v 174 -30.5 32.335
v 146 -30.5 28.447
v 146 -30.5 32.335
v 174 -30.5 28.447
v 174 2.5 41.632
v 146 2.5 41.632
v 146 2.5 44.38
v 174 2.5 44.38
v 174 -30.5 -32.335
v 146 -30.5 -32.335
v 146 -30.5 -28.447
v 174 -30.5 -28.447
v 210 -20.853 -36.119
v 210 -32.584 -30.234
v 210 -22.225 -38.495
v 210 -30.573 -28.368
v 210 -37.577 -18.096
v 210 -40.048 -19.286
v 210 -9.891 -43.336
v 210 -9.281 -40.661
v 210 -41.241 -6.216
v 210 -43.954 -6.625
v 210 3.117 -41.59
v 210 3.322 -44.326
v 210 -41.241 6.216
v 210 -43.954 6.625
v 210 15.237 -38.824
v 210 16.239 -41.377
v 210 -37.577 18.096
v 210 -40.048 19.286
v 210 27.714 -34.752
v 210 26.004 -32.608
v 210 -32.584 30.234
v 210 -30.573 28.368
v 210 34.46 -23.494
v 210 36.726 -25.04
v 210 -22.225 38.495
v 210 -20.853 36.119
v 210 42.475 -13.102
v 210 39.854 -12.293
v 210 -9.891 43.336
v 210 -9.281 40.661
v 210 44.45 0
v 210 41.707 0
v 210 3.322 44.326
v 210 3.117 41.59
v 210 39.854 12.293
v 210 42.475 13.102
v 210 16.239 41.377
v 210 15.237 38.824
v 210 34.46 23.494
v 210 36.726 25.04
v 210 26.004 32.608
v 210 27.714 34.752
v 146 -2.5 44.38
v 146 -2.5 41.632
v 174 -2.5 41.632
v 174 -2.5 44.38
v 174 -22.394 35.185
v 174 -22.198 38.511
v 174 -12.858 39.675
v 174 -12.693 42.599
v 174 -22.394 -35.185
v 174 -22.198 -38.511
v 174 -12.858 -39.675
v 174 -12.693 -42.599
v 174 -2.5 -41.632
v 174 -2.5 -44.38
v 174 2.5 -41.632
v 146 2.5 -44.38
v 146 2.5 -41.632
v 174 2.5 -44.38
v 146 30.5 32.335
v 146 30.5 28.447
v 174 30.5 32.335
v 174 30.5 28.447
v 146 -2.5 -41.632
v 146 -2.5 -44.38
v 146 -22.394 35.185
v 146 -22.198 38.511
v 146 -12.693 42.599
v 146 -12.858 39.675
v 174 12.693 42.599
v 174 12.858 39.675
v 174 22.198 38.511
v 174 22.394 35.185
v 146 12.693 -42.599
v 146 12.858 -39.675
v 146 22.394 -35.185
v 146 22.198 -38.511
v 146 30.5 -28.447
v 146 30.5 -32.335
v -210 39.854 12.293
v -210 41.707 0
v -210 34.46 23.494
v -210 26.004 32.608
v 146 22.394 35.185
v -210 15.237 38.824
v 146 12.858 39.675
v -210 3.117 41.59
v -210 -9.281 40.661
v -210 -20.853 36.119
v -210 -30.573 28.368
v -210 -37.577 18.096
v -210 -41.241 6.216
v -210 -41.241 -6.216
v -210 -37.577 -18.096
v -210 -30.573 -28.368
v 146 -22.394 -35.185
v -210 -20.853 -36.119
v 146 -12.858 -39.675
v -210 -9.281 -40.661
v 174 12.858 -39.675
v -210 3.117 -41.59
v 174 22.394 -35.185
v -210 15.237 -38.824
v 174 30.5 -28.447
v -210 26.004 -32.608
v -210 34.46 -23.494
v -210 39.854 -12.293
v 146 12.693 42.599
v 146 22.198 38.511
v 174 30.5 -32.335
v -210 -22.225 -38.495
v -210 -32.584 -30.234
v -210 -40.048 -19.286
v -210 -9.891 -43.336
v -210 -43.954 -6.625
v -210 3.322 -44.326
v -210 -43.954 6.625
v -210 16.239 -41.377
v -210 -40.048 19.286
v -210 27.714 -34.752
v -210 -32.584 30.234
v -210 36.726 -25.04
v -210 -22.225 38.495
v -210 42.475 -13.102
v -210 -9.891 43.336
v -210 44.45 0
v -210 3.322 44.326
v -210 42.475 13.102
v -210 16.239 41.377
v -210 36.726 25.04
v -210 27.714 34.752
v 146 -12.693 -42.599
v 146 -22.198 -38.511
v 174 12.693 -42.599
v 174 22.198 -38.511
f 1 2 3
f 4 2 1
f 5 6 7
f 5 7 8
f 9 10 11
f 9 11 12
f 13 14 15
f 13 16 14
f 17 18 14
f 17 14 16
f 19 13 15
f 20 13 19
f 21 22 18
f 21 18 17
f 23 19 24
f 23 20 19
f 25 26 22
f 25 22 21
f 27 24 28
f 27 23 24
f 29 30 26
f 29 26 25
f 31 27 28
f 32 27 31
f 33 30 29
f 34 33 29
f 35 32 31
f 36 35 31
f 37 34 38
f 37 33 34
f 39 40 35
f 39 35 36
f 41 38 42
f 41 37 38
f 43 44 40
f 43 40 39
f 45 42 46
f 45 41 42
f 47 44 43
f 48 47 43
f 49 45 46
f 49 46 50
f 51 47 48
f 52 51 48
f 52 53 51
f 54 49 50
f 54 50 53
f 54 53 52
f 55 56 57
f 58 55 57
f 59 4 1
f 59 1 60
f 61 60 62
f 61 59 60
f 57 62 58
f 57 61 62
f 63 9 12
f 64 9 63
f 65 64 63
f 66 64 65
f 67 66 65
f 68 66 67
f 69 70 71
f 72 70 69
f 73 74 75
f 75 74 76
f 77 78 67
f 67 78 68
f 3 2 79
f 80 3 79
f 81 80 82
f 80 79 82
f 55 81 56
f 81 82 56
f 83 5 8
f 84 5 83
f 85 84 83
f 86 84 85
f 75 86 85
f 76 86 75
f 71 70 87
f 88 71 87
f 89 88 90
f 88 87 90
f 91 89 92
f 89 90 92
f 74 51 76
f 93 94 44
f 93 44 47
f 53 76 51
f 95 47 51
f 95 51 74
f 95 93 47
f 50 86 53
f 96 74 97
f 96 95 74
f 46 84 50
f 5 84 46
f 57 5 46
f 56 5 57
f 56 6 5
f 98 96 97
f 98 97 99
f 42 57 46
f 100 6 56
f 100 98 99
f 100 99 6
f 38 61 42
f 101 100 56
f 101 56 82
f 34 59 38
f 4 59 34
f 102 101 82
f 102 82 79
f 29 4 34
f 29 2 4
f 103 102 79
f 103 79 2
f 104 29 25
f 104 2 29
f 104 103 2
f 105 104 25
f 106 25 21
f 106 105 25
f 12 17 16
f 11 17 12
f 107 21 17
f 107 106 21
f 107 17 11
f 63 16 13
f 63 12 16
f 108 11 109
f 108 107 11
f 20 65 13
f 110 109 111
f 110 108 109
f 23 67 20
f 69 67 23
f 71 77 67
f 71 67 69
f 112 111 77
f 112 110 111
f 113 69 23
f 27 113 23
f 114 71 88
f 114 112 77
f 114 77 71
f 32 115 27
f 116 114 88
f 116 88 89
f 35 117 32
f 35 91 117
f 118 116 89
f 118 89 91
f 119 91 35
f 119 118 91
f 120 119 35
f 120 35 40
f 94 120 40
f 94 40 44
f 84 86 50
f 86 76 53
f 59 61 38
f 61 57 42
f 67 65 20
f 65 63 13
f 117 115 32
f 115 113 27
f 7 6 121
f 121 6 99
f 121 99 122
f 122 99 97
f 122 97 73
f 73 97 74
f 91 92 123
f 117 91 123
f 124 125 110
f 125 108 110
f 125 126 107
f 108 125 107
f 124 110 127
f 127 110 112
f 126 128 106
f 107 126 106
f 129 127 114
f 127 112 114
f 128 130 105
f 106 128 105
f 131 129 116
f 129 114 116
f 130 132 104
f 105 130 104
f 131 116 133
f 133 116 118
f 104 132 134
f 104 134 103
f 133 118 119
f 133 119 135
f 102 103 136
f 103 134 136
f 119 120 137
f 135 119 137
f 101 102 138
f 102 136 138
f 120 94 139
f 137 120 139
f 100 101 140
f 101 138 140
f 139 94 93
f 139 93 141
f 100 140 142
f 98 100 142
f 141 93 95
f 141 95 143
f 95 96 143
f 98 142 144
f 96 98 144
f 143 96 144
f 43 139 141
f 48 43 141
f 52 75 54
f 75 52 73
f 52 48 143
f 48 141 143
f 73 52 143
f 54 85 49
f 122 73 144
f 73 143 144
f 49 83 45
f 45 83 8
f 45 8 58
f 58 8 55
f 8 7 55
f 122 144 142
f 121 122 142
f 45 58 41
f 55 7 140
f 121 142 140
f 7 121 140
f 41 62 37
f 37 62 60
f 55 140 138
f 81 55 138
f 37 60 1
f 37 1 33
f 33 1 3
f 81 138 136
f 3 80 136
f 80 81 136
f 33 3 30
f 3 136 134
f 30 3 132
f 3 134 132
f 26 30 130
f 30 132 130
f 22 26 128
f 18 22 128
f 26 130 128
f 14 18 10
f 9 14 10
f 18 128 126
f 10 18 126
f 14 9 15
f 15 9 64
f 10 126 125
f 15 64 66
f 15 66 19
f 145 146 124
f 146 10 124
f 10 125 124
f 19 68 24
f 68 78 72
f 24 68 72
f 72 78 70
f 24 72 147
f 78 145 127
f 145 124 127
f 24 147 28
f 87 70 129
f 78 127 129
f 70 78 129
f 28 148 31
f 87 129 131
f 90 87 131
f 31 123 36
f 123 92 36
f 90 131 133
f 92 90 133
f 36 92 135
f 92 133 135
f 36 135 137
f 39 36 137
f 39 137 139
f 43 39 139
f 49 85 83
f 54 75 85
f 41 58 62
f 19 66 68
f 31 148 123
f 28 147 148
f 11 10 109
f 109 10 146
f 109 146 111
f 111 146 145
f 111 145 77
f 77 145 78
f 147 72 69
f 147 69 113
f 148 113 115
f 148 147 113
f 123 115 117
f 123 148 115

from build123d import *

# Parameters (mm, degrees)
SKETCH12_R              = 44.45
SKETCH12_R_2            = 41.7068
PIPE_0_5_SCH_40_1_DEPTH = 420
CUT_EXTRUDE1_DEPTH      = 50
CUT_EXTRUDE1_DEPTH_BACK = 50
SKETCH13_W              = 28
SKETCH13_H              = 28


with BuildPart() as part:
    # Sketch12 → Pipe 0.5 SCH 40(1) (new body)
    with BuildSketch(Plane.YZ.offset(-210)):
        Circle(SKETCH12_R)
        Circle(SKETCH12_R_2, mode=Mode.SUBTRACT)
    extrude(amount=PIPE_0_5_SCH_40_1_DEPTH)

    # Sketch13 → Cut-Extrude1 (cut, two sides: drawn at the far end of the back side and taken through both)
    with BuildSketch(Plane.XY.offset(-CUT_EXTRUDE1_DEPTH_BACK)):
        with Locations((160, 16.5)):
            Rectangle(SKETCH13_W, SKETCH13_H)
        with Locations((160, -16.5)):
            Rectangle(SKETCH13_W, SKETCH13_H)
    extrude(amount=CUT_EXTRUDE1_DEPTH + CUT_EXTRUDE1_DEPTH_BACK, mode=Mode.SUBTRACT)


solid = part.part
